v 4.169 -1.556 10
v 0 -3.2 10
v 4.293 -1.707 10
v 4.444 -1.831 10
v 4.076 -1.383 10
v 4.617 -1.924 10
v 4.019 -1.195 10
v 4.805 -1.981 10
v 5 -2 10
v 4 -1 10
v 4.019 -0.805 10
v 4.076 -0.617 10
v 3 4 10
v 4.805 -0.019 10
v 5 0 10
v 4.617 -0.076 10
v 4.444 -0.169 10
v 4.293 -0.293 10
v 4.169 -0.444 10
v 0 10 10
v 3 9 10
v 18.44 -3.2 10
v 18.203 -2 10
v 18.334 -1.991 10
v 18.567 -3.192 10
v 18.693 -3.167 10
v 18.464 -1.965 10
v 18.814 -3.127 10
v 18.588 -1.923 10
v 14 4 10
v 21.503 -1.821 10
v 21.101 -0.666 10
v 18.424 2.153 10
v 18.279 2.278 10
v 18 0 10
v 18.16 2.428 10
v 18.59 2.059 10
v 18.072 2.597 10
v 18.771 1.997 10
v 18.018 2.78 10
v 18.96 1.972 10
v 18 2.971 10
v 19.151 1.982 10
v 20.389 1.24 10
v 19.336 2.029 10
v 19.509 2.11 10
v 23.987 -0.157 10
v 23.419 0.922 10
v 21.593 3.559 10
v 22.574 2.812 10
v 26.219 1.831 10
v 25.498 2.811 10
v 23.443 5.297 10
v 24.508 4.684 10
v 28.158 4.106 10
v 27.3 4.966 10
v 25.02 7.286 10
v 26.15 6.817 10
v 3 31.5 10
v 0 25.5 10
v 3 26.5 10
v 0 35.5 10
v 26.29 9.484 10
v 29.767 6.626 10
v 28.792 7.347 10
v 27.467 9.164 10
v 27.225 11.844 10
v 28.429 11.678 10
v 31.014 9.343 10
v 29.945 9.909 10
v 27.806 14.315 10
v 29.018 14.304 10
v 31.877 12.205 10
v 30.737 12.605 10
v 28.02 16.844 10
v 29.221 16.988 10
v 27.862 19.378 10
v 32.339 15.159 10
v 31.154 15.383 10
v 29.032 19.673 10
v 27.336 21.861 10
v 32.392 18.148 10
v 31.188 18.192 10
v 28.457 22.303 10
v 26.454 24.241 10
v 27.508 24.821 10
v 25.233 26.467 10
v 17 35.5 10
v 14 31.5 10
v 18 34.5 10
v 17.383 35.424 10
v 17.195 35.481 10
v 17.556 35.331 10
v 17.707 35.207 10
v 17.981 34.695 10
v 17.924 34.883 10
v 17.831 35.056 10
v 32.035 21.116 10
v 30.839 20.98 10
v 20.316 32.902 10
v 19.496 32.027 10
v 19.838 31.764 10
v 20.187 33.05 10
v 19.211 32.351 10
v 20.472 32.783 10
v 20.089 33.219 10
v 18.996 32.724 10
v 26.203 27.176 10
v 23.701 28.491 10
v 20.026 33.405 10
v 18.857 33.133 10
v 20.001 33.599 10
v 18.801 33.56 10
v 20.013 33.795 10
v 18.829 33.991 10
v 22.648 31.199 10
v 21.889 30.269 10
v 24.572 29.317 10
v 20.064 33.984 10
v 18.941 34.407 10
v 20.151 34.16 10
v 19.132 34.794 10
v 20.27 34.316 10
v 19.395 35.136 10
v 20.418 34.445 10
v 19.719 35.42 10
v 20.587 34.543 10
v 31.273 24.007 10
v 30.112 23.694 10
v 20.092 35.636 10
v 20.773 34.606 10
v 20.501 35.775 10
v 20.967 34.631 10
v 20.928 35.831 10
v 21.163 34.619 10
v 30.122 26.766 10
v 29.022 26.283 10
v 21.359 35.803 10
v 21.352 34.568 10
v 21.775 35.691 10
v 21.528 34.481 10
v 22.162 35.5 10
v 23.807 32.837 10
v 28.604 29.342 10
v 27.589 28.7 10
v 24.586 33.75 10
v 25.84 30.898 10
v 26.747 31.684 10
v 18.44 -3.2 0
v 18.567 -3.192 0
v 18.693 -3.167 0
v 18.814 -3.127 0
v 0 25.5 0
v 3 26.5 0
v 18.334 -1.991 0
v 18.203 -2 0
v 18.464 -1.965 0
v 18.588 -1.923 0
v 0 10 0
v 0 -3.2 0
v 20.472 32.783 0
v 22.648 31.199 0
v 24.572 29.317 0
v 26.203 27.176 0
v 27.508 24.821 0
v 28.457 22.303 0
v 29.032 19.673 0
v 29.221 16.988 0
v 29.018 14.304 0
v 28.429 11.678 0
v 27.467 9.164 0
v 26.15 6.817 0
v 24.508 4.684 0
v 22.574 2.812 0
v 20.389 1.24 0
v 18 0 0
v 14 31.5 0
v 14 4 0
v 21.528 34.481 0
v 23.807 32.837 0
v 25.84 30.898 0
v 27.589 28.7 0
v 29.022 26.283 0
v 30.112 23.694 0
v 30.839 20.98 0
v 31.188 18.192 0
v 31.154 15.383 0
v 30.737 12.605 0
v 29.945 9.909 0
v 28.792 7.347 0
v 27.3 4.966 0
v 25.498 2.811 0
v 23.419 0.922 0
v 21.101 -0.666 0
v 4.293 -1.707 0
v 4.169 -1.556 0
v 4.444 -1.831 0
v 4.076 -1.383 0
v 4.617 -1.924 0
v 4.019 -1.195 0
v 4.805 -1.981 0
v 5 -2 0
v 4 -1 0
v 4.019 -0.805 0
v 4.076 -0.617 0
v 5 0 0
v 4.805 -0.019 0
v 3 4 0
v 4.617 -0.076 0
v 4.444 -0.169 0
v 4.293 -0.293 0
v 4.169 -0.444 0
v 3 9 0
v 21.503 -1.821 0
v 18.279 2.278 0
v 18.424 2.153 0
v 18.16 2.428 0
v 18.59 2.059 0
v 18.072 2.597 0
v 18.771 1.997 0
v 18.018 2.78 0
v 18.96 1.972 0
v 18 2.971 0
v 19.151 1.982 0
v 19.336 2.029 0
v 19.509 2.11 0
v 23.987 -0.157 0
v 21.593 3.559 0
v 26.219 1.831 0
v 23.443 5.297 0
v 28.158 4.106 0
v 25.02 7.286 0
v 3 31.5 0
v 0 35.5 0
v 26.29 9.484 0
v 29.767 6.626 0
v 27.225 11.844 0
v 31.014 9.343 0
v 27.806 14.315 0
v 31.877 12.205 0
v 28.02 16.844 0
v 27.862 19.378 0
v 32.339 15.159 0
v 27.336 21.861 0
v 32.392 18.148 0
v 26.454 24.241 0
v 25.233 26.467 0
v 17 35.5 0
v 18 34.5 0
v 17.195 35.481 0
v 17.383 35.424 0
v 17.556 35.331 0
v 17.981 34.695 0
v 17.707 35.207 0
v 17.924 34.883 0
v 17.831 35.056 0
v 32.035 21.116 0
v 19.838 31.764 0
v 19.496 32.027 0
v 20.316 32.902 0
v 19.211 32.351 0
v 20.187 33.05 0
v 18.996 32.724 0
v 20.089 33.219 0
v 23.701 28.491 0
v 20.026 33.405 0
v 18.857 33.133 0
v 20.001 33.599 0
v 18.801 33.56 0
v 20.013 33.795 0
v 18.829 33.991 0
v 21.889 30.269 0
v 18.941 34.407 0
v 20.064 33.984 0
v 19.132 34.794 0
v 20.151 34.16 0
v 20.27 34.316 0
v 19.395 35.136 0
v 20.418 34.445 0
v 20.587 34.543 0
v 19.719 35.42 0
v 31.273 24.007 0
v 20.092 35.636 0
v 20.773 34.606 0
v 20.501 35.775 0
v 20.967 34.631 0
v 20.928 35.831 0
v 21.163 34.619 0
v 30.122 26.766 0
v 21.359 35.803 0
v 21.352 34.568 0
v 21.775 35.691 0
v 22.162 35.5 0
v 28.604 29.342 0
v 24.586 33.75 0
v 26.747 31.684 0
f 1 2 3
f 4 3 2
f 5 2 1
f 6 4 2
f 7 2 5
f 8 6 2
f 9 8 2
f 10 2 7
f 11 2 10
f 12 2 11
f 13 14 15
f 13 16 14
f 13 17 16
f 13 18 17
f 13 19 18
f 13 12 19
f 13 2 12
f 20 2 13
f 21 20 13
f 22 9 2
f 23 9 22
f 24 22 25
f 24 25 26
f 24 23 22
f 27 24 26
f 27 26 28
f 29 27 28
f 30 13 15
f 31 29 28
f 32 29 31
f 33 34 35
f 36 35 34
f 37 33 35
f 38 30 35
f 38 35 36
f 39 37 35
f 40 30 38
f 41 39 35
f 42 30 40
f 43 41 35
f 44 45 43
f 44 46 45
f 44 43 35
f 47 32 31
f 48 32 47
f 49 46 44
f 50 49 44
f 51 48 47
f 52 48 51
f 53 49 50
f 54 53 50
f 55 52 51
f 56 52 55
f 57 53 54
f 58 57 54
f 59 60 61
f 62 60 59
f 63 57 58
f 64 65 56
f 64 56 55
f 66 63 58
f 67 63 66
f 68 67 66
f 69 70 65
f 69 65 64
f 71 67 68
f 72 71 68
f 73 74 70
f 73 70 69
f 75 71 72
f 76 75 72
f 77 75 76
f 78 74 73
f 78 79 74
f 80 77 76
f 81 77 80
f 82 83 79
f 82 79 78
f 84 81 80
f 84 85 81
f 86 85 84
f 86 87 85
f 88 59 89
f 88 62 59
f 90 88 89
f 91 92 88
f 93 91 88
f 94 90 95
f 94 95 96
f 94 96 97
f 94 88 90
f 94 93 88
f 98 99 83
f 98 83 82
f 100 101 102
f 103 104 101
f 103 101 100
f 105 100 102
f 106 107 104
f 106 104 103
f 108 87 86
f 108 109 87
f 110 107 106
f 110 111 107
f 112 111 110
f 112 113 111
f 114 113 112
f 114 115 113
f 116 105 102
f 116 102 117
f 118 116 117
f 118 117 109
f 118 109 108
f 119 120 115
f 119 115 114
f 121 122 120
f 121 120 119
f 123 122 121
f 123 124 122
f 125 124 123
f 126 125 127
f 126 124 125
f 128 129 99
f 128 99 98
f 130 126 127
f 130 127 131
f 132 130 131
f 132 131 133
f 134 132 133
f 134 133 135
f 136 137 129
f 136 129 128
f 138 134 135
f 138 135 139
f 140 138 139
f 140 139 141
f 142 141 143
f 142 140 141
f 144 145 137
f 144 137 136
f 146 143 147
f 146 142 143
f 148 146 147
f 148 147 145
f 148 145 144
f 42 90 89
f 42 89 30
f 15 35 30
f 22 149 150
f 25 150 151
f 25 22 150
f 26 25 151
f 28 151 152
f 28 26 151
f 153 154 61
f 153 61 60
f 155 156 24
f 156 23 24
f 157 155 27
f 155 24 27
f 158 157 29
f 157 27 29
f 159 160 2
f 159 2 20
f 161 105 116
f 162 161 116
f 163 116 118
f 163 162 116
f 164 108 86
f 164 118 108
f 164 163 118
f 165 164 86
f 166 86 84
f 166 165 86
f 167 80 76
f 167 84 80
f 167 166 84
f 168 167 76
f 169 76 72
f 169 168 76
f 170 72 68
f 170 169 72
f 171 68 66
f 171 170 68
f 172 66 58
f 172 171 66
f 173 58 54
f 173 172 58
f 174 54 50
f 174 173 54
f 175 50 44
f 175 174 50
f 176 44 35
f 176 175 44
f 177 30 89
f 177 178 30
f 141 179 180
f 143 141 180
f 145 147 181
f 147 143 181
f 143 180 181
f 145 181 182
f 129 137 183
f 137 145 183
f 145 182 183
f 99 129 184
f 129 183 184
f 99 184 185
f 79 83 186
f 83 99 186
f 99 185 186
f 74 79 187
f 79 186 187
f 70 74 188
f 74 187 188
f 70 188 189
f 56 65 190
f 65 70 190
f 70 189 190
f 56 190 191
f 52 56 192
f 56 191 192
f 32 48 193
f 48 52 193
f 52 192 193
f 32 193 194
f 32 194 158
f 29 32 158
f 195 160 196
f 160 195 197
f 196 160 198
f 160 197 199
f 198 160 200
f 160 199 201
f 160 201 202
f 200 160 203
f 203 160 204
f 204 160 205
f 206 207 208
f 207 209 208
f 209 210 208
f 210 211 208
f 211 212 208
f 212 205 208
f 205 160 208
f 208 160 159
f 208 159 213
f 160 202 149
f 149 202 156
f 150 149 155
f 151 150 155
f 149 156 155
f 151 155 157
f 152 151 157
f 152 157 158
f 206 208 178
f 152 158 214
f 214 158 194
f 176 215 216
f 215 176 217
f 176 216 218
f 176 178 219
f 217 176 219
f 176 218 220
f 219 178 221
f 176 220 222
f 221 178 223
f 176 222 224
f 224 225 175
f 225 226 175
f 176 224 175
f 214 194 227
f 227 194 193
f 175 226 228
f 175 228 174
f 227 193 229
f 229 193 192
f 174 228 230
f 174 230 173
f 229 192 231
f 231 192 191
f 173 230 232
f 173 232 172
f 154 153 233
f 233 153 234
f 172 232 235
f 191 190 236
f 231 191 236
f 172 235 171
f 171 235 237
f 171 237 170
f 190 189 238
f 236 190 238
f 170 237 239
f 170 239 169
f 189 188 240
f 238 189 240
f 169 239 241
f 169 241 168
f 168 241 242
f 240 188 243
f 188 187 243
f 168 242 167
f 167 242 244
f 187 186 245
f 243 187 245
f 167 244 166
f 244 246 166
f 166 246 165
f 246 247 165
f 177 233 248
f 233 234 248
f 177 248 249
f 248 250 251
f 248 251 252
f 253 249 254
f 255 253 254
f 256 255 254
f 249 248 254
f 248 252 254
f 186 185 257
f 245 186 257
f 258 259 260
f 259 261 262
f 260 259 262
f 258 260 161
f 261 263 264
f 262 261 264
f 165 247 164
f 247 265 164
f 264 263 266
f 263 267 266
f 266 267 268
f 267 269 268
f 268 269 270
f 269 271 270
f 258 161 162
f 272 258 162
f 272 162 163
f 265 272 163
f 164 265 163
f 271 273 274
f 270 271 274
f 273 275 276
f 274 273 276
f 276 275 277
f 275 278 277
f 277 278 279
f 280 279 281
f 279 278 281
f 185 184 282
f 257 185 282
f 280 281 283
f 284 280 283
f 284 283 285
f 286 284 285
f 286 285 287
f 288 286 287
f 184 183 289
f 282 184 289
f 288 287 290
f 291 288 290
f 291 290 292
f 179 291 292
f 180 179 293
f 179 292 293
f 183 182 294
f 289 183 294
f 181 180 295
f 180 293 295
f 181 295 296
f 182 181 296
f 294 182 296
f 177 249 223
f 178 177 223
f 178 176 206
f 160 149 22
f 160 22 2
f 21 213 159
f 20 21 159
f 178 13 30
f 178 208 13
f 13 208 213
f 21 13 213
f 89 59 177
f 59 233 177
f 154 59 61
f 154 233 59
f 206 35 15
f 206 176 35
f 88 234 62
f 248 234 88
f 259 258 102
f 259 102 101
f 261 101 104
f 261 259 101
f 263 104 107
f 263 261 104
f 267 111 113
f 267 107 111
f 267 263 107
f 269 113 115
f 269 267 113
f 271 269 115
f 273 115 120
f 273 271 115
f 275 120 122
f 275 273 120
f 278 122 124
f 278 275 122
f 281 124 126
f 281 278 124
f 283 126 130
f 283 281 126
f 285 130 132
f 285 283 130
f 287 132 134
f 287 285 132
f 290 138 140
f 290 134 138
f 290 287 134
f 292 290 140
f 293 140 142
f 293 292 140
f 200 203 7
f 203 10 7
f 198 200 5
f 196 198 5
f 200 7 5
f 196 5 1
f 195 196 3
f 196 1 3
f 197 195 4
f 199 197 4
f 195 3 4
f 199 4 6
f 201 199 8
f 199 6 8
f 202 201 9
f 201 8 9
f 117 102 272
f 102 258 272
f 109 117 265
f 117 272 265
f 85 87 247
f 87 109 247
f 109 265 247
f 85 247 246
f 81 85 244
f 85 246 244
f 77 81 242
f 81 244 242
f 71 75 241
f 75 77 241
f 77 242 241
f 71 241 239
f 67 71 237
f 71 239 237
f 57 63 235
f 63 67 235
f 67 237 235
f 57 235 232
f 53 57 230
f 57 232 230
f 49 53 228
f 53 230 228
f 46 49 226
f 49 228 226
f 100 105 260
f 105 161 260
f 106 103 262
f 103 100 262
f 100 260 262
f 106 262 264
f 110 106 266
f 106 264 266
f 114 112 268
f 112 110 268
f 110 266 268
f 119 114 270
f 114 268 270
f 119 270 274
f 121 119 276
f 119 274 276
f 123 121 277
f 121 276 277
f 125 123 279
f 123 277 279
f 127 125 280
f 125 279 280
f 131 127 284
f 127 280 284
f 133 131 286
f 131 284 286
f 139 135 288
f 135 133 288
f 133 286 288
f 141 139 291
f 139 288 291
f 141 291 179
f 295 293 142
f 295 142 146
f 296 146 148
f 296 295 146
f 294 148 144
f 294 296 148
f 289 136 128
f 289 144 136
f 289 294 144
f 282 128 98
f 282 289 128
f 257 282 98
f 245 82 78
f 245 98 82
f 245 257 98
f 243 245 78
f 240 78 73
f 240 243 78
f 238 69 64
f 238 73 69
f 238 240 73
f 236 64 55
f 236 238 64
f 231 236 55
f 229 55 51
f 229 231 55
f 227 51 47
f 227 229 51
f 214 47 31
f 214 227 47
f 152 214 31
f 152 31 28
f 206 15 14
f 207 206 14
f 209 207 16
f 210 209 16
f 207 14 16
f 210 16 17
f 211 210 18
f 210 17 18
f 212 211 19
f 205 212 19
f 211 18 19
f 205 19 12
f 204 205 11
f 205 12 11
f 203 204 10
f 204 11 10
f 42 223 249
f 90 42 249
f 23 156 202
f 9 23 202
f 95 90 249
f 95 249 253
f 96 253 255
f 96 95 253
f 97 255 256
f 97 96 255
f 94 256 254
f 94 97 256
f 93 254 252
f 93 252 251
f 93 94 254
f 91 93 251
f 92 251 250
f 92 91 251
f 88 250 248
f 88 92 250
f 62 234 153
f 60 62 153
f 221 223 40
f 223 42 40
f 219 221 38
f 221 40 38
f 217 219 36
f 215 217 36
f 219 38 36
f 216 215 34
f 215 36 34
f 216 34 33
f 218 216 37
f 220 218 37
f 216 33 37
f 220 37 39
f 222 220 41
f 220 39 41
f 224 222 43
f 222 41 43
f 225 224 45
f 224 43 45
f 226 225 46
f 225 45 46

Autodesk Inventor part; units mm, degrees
ref_plane "YZ Plane" through (0, 0, 0) normal (1, 0, 0) x (0, 1, 0)
ref_plane "XZ Plane" through (0, 0, 0) normal (0, 1, 0) x (-1, 0, 0)
ref_plane "XY Plane" through (0, 0, 0) normal (0, 0, 1) x (1, 0, 0)
sketch "Sketch1" plane through (0, 0, 0) normal (0, 0, 1) x (1, 0, 0)
  line L0 (14, 4) -> (14, 17.75)
  line L1 (14, 17.75) -> (18, 17.75) construction
  line L2 (18, 17.75) -> (18, 0)
  line L3 (3, 4) -> (3, 9)
  line L4 (3, 9) -> (0, 10)
  line L5 (3, 4) -> (14, 4)
  line L6 (14, 31.5) -> (14, 17.75)
  line L7 (18, 17.75) -> (18, 35.5)
  line L8 (3, 31.5) -> (3, 26.5)
  line L9 (3, 26.5) -> (0, 25.5)
  line L10 (3, 31.5) -> (14, 31.5)
  line L11 (-3.6, 0) -> (21.6, 0) construction
  line L12 (0, 35.5) -> (18, 35.5)
  line L13 (18, 0) -> (0, 0)
  line L14 (0, 35.5) -> (0, 25.5)
  line L15 (0, 0) -> (0, 10)
  dimension "d1" = 4
  dimension "d5" = 5
  dimension "d8" = 13.75
  dimension "d9" = 11
  dimension "d26" = 6
  dimension "d27" = 4
  dimension "d28" = 3
extrude "Extrusion1" add sketch "Sketch1" along normal blind 10
sketch "Sketch2" plane through (0, 0, 0) normal (0, 0, 1) x (1, 0, 0)
  circle A0 centre (23, 17.75) radius 5 construction
  line L0 (23, 17.75) -> (18, 17.75) construction
  arc A1 (18.6314, -3.2) -> (22.1621, 35.5) centre (10.6764, 17.0368) ccw
  arc A2 (18, 0) -> (20.4718, 32.7828) centre (10.6764, 17.0368) ccw
  arc A3 (18, 1.3146) -> (19.8379, 31.7639) centre (10.6764, 17.0368) ccw
  arc A4 (22.1621, 35.5) -> (19.8379, 31.7639) centre (21, 33.632) ccw
  arc A5 (21.5282, 34.4811) -> (20.4718, 32.7828) centre (21, 33.632) ccw
  line L1 (0, 0) -> (18, 0) projected
  line L2 (0, 2.0656) -> (0, 0)
  line L3 (18, 0) -> (18, 35.5) projected
  line L4 (18, 1.3146) -> (18, 0)
  line L5 (18, 0) -> (18, 35.5) projected
  arc A6 (18.4007, -2) -> (21.5282, 34.4811) centre (10.6764, 17.0368) ccw
  line L6 (0, 0) -> (18, 0) projected
  line L7 (18.4007, -2) -> (4, -2)
  line L8 (4, -2) -> (4, 0)
  line L9 (18.6314, -3.2) -> (0, -3.2)
  line L10 (0, -3.2) -> (0, 0)
  line L11 (29.1528, 15.4528) -> (31.1455, 15.282) construction
  dimension "d12" = 10
  dimension "d24" = 2.2
  dimension "d33" = 3
  dimension "d39" = 1.2
  dimension "d40" = 4
  dimension "d41" = 2
  dimension "d42" = 2
  dimension "d43" = 1.2
extrude "Extrusion2" add sketch "Sketch2" along normal blind 10 contours L9 L10 L1 L8 L7 A6 A5 A2 L3 A3 A4 A1
fillet "Fillet3" radius 1 5 edges at (18, 1.3146, 5) (18.4007, -2, 5) (4, 0, 5) (4, -2, 5) (18.6314, -3.2, 5)
fillet "Fillet4" radius 1 1 edges at (18, 35.5, 5)
properties part number "Clip"
